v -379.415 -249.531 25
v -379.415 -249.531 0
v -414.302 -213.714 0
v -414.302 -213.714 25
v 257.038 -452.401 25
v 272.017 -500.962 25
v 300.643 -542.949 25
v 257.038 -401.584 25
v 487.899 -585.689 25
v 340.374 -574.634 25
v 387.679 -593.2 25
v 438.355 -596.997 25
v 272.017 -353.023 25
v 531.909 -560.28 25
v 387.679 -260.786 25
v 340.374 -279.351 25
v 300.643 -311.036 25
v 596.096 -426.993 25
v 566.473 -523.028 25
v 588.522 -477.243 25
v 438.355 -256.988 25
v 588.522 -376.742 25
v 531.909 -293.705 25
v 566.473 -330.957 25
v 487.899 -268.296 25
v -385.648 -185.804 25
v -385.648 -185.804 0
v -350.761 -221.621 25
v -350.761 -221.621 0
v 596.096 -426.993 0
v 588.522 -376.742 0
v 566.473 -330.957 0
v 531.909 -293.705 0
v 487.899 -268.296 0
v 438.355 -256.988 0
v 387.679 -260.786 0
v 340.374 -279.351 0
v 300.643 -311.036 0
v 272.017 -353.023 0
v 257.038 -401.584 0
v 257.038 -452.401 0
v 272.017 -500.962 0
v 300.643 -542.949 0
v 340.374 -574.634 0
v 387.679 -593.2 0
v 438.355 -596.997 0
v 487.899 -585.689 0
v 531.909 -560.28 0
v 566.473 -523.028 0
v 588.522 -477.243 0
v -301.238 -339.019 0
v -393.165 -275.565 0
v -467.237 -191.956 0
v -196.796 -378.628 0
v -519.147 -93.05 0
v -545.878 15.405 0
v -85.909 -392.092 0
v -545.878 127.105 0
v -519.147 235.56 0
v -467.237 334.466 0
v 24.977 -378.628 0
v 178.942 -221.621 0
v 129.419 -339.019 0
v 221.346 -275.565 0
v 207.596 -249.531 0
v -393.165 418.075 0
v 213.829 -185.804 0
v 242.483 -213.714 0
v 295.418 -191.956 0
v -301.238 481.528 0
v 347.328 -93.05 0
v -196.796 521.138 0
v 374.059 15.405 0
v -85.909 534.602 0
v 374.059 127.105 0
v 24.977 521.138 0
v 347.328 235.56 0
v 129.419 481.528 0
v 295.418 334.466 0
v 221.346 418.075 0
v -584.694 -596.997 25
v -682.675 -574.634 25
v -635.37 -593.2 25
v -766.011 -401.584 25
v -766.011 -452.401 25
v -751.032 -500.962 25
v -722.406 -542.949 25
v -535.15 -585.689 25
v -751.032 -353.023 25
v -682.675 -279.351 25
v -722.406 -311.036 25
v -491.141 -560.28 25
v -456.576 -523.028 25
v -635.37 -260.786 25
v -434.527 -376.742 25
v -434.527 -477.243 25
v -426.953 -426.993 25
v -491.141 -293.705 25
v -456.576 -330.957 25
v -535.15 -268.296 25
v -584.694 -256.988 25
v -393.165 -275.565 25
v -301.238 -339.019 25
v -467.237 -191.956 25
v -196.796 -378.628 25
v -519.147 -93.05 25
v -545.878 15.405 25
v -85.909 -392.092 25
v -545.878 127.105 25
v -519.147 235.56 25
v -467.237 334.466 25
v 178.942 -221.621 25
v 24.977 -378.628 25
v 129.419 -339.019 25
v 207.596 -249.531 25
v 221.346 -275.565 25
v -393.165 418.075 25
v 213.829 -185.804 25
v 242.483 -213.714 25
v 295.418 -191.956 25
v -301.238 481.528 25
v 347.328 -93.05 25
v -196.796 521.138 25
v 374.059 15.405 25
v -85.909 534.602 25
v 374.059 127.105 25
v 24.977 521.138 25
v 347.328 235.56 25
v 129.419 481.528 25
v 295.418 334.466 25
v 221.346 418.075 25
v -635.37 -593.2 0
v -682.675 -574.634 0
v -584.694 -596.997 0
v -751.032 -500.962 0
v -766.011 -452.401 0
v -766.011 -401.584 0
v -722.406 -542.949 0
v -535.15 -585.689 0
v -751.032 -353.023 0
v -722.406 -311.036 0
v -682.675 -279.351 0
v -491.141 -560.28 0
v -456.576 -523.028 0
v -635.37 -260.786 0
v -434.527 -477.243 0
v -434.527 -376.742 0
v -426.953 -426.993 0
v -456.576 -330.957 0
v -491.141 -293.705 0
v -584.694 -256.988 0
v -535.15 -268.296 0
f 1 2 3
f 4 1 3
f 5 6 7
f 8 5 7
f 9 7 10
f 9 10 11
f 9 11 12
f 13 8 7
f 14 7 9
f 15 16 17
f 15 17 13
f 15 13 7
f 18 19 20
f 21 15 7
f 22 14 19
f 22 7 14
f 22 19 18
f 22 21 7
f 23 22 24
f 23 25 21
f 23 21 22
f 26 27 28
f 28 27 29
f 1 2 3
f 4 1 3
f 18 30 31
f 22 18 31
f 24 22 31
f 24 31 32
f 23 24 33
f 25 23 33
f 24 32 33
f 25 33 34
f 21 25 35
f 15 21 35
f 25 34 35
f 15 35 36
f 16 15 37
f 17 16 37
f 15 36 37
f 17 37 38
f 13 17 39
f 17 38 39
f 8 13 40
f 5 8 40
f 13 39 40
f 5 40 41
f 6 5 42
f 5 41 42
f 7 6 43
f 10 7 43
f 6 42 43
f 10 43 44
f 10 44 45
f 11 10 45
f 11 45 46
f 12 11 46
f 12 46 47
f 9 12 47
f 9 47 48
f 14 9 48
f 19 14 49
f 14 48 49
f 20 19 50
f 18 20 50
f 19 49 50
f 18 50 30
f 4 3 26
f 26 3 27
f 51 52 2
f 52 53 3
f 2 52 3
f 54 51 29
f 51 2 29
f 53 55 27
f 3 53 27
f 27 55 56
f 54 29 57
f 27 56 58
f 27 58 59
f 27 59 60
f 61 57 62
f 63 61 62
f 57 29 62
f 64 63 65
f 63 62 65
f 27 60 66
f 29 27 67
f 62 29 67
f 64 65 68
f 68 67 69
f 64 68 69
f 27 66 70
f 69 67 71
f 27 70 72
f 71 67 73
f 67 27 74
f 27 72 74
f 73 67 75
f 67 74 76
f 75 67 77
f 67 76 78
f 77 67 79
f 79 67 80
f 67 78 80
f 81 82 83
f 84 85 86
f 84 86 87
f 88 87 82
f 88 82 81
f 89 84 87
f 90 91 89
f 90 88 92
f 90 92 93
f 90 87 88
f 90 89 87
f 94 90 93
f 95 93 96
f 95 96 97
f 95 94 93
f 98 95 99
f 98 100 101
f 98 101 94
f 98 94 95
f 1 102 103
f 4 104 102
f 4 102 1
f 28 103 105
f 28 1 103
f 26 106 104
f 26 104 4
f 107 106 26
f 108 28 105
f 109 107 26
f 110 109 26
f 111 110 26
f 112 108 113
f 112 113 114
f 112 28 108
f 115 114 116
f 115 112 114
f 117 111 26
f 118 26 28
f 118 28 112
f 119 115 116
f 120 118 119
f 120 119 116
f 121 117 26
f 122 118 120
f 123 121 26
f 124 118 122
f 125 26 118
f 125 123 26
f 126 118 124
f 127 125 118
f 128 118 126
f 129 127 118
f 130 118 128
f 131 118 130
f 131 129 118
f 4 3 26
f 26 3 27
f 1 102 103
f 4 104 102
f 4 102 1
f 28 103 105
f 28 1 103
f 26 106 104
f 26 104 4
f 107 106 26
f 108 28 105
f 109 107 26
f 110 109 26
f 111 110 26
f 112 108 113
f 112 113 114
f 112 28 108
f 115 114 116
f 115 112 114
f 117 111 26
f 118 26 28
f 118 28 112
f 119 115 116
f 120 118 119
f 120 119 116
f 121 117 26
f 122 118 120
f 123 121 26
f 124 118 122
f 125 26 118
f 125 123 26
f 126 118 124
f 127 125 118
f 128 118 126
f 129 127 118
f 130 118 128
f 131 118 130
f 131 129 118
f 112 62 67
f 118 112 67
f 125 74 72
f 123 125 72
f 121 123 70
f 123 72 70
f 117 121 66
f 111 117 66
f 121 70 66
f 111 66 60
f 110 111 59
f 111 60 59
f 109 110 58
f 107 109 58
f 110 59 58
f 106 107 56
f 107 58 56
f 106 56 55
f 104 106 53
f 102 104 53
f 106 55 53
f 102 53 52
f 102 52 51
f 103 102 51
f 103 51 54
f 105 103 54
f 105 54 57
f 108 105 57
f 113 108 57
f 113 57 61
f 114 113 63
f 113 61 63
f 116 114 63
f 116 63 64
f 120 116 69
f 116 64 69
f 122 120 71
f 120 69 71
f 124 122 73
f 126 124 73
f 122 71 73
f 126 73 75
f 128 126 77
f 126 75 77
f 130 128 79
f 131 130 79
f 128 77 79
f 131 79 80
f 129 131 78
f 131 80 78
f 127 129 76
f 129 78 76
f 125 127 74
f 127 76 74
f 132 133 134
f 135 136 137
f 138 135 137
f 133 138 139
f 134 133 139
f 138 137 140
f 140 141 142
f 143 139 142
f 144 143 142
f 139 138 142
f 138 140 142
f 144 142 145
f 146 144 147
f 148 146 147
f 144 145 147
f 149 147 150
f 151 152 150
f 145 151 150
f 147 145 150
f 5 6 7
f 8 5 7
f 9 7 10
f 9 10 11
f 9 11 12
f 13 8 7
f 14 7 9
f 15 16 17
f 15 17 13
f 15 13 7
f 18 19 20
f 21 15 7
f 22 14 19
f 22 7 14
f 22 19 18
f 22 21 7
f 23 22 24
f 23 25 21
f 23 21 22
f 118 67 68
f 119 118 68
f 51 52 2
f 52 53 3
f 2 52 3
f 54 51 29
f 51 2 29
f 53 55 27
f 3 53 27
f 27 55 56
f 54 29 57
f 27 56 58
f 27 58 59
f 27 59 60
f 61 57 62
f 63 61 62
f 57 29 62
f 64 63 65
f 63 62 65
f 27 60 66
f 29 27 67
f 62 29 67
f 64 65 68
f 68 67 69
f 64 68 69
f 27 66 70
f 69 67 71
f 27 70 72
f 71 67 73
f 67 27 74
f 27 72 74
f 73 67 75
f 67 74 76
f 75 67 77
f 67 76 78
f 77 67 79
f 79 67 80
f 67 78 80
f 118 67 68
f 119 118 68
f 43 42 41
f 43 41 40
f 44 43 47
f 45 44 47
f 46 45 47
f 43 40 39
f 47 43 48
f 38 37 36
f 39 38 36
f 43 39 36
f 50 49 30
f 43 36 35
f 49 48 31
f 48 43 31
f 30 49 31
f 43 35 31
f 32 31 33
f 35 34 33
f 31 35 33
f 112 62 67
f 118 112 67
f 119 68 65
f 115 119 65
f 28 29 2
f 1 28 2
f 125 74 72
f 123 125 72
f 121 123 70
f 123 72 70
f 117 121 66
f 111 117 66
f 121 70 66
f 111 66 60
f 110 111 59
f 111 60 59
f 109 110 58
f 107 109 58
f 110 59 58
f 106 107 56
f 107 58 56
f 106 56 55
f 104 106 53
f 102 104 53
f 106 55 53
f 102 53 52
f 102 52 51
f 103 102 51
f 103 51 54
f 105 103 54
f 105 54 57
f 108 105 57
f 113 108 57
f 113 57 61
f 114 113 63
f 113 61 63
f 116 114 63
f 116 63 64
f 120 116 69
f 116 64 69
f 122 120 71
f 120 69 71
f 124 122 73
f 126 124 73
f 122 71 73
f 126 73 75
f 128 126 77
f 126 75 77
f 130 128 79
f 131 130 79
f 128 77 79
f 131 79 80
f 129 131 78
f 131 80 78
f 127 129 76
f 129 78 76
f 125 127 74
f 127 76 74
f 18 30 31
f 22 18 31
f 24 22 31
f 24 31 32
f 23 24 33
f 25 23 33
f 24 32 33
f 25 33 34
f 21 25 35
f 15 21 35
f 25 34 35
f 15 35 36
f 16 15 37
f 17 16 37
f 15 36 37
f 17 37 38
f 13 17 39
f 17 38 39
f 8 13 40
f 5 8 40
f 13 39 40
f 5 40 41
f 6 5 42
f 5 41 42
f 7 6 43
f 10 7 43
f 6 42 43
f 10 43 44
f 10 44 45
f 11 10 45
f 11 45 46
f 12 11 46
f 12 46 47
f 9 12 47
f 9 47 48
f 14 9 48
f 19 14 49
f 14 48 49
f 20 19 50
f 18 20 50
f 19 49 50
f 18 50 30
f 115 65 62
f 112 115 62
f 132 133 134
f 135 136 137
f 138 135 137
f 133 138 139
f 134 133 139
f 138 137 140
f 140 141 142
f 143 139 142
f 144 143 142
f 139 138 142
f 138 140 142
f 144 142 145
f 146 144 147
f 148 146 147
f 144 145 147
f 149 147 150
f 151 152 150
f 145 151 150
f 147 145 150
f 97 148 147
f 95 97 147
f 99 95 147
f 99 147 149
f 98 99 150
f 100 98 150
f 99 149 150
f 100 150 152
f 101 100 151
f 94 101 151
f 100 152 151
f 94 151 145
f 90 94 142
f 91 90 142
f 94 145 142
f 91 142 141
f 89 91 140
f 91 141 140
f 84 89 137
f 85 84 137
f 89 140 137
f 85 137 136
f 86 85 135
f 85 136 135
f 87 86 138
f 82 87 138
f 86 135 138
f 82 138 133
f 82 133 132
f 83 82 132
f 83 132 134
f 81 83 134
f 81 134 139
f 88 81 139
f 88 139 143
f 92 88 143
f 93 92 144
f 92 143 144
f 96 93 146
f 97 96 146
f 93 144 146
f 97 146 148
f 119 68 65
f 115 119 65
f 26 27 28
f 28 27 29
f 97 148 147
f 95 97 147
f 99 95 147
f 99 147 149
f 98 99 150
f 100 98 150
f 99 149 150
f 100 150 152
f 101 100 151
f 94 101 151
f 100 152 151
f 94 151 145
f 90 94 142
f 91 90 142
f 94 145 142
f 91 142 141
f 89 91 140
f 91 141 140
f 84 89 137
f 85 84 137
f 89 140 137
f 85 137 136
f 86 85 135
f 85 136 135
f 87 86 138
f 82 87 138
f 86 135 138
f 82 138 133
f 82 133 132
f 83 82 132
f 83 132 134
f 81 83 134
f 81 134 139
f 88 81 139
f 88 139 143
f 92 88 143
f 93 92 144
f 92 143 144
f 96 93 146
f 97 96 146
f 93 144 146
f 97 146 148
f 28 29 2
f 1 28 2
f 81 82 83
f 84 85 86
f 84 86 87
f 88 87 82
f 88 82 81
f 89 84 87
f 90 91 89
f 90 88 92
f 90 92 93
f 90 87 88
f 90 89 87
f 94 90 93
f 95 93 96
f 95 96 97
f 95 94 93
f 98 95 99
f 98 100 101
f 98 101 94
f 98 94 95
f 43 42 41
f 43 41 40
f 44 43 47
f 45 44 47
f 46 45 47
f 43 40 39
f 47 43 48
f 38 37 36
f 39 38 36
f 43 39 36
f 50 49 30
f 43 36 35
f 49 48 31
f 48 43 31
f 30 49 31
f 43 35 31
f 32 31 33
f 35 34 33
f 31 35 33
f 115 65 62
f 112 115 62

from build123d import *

# Parameters (mm, degrees)
F0_R     = 170.481328
F1_DEPTH = 25
F2_DEPTH = 25


with BuildPart() as f1:
    # F0 (on Top) → F1 (new body)
    with BuildSketch(Plane.XY):
        with BuildLine():
            ThreePointArc((-85.909493, -392.09225), (377.437586, 71.254829), (-85.909493, 534.601908))
            ThreePointArc((-85.909493, 534.601908), (-549.256572, 71.254829), (-85.909493, -392.09225))
        make_face()
        Polygon((-379.41452, -249.531415), (-414.301964, -213.714293), (-385.648267, -185.804338), (-350.760823, -221.62146), align=None, mode=Mode.SUBTRACT)
        Polygon((242.482978, -213.714293), (207.595534, -249.531415), (178.941836, -221.62146), (213.82928, -185.804338), align=None, mode=Mode.SUBTRACT)
        with Locations((-597.434128, -426.99254)):
            Circle(F0_R)
        with Locations((425.615141, -426.99254)):
            Circle(F0_R)
    extrude(amount=F1_DEPTH)


with BuildPart() as f2:
    # F0 (on Top) → F2 (new body)
    with BuildSketch(Plane.XY):
        with BuildLine():
            ThreePointArc((-85.909493, -392.09225), (377.437586, 71.254829), (-85.909493, 534.601908))
            ThreePointArc((-85.909493, 534.601908), (-549.256572, 71.254829), (-85.909493, -392.09225))
        make_face()
        Polygon((-379.41452, -249.531415), (-414.301964, -213.714293), (-385.648267, -185.804338), (-350.760823, -221.62146), align=None, mode=Mode.SUBTRACT)
        Polygon((242.482978, -213.714293), (207.595534, -249.531415), (178.941836, -221.62146), (213.82928, -185.804338), align=None, mode=Mode.SUBTRACT)
        with Locations((-597.434128, -426.99254)):
            Circle(F0_R)
        with Locations((425.615141, -426.99254)):
            Circle(F0_R)
    extrude(amount=F2_DEPTH)


solid = Compound([f1.part, f2.part])
